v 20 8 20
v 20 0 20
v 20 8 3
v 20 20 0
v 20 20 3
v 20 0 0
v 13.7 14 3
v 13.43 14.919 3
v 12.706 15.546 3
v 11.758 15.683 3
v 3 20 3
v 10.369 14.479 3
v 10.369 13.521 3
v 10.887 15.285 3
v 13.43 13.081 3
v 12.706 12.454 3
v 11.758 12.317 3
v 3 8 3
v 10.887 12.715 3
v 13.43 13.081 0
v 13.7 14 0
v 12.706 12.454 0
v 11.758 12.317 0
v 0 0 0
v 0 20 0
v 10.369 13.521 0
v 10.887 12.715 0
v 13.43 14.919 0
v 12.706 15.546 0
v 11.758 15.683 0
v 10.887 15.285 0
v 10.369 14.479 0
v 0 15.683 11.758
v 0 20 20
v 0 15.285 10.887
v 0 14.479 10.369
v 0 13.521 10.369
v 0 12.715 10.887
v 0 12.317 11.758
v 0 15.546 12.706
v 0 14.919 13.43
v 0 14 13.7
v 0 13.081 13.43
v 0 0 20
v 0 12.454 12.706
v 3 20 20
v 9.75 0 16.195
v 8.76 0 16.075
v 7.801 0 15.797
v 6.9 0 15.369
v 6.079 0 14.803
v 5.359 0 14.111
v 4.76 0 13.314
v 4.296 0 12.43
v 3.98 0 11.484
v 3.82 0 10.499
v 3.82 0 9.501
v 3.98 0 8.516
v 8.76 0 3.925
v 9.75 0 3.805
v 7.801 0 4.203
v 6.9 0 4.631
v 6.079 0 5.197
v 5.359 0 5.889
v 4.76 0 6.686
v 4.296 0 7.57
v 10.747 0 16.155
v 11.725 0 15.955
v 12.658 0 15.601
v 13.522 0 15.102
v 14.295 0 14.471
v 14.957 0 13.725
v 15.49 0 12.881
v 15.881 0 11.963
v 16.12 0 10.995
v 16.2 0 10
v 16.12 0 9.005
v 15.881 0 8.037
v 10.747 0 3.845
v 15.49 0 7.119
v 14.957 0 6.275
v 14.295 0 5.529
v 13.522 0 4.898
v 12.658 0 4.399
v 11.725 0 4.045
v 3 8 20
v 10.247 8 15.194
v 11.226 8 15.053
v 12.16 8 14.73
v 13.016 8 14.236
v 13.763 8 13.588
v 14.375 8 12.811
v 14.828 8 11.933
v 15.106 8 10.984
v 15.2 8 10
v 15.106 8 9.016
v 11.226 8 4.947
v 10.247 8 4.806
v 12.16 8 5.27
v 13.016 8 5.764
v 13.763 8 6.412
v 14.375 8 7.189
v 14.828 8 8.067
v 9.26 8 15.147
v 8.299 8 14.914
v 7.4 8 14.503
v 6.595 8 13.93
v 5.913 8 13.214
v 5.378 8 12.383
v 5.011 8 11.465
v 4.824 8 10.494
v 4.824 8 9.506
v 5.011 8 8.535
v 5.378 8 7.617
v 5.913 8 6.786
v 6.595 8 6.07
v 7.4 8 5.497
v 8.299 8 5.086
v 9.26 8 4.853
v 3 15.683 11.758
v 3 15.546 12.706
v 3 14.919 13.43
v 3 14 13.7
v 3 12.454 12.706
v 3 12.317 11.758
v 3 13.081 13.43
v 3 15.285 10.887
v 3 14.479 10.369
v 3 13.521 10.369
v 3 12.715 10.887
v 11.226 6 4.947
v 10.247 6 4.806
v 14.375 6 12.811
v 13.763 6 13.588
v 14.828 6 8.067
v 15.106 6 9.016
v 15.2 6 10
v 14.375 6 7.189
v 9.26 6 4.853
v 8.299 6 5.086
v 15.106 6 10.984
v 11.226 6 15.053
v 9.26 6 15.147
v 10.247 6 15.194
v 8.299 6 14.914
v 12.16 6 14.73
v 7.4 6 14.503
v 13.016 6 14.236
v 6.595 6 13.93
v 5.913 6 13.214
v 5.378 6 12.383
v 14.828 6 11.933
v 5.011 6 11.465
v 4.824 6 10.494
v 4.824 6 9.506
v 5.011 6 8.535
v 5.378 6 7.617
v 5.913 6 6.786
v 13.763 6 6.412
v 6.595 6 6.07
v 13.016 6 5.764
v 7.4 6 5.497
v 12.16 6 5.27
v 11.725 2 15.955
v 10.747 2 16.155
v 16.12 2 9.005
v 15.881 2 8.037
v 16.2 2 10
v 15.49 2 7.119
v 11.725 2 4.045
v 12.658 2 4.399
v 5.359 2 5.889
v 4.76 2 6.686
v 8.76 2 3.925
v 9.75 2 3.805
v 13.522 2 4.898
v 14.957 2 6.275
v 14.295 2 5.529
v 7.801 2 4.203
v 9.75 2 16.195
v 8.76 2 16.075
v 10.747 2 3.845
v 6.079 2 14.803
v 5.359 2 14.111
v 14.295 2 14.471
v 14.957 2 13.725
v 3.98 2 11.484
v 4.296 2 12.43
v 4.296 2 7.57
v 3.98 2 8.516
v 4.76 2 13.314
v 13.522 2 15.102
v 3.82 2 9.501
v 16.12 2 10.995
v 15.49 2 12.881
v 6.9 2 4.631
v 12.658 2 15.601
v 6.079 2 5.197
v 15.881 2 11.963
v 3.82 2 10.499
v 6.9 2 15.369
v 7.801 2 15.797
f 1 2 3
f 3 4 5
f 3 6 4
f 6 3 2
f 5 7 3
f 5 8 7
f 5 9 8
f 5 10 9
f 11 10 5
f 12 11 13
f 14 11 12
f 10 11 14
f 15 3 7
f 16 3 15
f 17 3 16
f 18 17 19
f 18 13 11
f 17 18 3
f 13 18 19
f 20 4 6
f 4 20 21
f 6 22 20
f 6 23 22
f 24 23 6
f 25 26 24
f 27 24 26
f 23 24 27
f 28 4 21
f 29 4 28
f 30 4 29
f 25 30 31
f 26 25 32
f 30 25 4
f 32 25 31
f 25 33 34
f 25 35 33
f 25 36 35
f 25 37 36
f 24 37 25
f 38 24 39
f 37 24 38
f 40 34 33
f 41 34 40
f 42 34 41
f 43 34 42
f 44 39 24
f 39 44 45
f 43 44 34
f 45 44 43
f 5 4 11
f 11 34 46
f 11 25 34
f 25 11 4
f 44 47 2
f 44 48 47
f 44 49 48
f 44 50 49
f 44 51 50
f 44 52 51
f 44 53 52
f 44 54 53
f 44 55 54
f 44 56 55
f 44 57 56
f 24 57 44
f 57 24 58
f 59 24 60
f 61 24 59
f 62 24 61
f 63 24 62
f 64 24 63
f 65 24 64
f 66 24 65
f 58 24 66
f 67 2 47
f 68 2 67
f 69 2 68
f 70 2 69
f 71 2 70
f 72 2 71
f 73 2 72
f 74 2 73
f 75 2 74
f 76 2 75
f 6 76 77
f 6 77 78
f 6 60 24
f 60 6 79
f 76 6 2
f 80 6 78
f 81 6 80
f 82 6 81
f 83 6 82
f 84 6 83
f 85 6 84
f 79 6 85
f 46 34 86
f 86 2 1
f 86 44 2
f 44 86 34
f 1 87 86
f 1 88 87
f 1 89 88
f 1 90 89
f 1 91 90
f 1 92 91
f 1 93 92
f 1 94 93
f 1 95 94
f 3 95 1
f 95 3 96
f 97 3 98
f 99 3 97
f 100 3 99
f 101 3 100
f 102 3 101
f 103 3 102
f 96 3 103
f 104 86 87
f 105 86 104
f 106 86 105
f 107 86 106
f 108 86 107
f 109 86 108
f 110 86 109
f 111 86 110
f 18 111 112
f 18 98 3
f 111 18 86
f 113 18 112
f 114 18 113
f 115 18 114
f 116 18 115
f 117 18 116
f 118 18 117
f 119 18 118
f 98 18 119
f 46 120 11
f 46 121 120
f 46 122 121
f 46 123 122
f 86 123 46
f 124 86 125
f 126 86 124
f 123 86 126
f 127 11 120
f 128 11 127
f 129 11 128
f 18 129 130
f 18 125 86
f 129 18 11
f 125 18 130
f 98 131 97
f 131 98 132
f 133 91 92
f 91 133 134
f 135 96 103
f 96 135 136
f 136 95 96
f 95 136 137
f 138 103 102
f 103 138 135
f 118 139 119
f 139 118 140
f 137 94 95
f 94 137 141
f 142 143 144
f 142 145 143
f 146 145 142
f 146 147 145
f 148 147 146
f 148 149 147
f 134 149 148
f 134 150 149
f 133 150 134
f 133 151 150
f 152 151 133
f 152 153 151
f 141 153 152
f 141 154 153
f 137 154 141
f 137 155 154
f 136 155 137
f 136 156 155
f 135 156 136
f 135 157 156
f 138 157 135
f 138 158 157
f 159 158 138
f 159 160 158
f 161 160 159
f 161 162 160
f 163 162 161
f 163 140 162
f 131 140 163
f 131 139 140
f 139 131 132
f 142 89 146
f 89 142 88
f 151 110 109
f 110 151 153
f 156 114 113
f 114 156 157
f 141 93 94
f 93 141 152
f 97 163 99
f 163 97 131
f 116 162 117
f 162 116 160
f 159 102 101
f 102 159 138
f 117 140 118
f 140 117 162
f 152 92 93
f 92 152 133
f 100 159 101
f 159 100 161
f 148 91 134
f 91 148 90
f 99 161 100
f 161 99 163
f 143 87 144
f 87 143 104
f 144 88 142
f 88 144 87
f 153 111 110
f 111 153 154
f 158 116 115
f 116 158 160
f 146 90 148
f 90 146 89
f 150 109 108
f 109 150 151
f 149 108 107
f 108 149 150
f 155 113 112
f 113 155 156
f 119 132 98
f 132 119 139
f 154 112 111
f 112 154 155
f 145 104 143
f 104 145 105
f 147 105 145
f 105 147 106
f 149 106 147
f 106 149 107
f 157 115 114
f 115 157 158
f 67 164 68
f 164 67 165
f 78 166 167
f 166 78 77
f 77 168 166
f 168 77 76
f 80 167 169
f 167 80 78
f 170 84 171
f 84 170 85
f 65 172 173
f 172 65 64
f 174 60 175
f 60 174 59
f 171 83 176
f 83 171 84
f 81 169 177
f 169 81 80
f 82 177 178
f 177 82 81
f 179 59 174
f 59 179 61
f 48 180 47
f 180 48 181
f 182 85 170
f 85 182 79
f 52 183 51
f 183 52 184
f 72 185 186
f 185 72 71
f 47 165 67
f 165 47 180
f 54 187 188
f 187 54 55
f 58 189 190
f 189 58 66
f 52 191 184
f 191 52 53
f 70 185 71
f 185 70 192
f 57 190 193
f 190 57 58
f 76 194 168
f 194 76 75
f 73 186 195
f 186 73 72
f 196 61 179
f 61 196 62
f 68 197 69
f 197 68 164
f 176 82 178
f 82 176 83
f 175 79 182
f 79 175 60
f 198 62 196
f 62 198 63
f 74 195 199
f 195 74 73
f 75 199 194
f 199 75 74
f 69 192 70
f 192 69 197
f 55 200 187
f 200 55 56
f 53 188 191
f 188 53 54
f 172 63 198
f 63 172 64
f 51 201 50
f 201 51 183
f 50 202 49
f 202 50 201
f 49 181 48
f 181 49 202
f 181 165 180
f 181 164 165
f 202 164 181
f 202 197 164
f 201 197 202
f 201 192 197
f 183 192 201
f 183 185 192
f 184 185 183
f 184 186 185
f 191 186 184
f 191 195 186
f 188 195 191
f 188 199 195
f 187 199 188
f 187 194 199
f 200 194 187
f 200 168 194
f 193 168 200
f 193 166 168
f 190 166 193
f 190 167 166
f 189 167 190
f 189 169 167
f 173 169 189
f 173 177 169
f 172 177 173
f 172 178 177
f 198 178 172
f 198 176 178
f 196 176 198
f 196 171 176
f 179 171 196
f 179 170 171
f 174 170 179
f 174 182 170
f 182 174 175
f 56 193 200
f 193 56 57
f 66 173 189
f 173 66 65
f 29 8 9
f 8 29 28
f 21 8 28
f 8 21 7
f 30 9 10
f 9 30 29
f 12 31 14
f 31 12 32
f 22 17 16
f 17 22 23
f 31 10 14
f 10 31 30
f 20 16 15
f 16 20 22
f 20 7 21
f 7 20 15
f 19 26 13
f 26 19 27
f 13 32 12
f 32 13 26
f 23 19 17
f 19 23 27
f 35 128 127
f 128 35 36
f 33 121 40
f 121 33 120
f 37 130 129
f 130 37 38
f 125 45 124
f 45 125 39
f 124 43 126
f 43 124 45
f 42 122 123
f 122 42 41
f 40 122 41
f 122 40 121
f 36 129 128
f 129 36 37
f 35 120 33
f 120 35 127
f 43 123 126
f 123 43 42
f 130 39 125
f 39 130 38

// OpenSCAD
// file: config.scad
//General Settings
play=0.2; //to make fittings (add to some holes if nessesary)
//circle resolution 
$fa = 3;
$fs = 1;//0.5;

aluminum = [0.9, 0.9, 0.9];
steel = [0.8, 0.8, 0.9];
wood="BurlyWood";

//ISO/DIN Parts 
//Kugellager
kugellager_d=5+play;
kugellager_h=2.5+play;

//Mutter M2
M2_nut_d=4.38+2*play;
M2_nut_w=4+2*play;
M2_nut_h=1.6+2*play;

//Mutter M3
M3_nut_d=6.01+2*play;
M3_nut_w=5.5+2*play;
M3_nut_h=2.4+2*play;

//Mutter M4
M4_nut_d=7.66+2*play;
M4_nut_w=7+2*play;
M4_nut_h=3.2+2*play;

//Mutter M5
M5_nut_d=9.23+2*play;
M5_nut_w=8+2*play;
M5_nut_h=4+2*play;


//Mutter M8
M8_nut_d=14.38+2*play;
M8_nut_w=13+2*play;
M8_nut_h=6.8+2*play;

//LMXXUU Linear Ball Bearing
LMXXUU_d=19;
LMXXUU_l=29;

//Pully 2.5
band_w=5;
band_b=2;
band_outer_d=13;
//Ballbearing opposit for pully
band_bb_id=5;
band_bb_od=11;
band_bb_w=4;

//Bearing
B608Z_od=22+2*play;
B608Z_id=8+2*play;
B608Z_isd=13;
B608Z_h=7;

//Nema17
nema17_od=42.3;
nema17_id=22+2*play;
nema17_screw_d=31;
nema17_l=48;

//Nema17
nema23_id=38.1+2*play;
nema23_screw_d=47.14;
// main file
include <config.scad>

module corner(){
    difference(){
        union(){
            cube([20,20,3]);

            cube([20,8,20]);

            cube([3,20,20]);

        }
        
        rotate([-90,0,0])
        translate([20/2,-20/2,0]){
            translate([0,0,8-2])
                cylinder(h=3,d=10+play*2);
            translate([0,0,-3+2])
                cylinder(h=3,d=12+play*2);
        }
        
        translate([20/2+2,20/2+4,-1])
            cylinder(h=3+2,d=3+play*2);

        rotate([0,-90,0])
        translate([20/2+2,20/2+4,-3-1])
            cylinder(h=3+2,d=3+play*2);
    }
}

corner();
